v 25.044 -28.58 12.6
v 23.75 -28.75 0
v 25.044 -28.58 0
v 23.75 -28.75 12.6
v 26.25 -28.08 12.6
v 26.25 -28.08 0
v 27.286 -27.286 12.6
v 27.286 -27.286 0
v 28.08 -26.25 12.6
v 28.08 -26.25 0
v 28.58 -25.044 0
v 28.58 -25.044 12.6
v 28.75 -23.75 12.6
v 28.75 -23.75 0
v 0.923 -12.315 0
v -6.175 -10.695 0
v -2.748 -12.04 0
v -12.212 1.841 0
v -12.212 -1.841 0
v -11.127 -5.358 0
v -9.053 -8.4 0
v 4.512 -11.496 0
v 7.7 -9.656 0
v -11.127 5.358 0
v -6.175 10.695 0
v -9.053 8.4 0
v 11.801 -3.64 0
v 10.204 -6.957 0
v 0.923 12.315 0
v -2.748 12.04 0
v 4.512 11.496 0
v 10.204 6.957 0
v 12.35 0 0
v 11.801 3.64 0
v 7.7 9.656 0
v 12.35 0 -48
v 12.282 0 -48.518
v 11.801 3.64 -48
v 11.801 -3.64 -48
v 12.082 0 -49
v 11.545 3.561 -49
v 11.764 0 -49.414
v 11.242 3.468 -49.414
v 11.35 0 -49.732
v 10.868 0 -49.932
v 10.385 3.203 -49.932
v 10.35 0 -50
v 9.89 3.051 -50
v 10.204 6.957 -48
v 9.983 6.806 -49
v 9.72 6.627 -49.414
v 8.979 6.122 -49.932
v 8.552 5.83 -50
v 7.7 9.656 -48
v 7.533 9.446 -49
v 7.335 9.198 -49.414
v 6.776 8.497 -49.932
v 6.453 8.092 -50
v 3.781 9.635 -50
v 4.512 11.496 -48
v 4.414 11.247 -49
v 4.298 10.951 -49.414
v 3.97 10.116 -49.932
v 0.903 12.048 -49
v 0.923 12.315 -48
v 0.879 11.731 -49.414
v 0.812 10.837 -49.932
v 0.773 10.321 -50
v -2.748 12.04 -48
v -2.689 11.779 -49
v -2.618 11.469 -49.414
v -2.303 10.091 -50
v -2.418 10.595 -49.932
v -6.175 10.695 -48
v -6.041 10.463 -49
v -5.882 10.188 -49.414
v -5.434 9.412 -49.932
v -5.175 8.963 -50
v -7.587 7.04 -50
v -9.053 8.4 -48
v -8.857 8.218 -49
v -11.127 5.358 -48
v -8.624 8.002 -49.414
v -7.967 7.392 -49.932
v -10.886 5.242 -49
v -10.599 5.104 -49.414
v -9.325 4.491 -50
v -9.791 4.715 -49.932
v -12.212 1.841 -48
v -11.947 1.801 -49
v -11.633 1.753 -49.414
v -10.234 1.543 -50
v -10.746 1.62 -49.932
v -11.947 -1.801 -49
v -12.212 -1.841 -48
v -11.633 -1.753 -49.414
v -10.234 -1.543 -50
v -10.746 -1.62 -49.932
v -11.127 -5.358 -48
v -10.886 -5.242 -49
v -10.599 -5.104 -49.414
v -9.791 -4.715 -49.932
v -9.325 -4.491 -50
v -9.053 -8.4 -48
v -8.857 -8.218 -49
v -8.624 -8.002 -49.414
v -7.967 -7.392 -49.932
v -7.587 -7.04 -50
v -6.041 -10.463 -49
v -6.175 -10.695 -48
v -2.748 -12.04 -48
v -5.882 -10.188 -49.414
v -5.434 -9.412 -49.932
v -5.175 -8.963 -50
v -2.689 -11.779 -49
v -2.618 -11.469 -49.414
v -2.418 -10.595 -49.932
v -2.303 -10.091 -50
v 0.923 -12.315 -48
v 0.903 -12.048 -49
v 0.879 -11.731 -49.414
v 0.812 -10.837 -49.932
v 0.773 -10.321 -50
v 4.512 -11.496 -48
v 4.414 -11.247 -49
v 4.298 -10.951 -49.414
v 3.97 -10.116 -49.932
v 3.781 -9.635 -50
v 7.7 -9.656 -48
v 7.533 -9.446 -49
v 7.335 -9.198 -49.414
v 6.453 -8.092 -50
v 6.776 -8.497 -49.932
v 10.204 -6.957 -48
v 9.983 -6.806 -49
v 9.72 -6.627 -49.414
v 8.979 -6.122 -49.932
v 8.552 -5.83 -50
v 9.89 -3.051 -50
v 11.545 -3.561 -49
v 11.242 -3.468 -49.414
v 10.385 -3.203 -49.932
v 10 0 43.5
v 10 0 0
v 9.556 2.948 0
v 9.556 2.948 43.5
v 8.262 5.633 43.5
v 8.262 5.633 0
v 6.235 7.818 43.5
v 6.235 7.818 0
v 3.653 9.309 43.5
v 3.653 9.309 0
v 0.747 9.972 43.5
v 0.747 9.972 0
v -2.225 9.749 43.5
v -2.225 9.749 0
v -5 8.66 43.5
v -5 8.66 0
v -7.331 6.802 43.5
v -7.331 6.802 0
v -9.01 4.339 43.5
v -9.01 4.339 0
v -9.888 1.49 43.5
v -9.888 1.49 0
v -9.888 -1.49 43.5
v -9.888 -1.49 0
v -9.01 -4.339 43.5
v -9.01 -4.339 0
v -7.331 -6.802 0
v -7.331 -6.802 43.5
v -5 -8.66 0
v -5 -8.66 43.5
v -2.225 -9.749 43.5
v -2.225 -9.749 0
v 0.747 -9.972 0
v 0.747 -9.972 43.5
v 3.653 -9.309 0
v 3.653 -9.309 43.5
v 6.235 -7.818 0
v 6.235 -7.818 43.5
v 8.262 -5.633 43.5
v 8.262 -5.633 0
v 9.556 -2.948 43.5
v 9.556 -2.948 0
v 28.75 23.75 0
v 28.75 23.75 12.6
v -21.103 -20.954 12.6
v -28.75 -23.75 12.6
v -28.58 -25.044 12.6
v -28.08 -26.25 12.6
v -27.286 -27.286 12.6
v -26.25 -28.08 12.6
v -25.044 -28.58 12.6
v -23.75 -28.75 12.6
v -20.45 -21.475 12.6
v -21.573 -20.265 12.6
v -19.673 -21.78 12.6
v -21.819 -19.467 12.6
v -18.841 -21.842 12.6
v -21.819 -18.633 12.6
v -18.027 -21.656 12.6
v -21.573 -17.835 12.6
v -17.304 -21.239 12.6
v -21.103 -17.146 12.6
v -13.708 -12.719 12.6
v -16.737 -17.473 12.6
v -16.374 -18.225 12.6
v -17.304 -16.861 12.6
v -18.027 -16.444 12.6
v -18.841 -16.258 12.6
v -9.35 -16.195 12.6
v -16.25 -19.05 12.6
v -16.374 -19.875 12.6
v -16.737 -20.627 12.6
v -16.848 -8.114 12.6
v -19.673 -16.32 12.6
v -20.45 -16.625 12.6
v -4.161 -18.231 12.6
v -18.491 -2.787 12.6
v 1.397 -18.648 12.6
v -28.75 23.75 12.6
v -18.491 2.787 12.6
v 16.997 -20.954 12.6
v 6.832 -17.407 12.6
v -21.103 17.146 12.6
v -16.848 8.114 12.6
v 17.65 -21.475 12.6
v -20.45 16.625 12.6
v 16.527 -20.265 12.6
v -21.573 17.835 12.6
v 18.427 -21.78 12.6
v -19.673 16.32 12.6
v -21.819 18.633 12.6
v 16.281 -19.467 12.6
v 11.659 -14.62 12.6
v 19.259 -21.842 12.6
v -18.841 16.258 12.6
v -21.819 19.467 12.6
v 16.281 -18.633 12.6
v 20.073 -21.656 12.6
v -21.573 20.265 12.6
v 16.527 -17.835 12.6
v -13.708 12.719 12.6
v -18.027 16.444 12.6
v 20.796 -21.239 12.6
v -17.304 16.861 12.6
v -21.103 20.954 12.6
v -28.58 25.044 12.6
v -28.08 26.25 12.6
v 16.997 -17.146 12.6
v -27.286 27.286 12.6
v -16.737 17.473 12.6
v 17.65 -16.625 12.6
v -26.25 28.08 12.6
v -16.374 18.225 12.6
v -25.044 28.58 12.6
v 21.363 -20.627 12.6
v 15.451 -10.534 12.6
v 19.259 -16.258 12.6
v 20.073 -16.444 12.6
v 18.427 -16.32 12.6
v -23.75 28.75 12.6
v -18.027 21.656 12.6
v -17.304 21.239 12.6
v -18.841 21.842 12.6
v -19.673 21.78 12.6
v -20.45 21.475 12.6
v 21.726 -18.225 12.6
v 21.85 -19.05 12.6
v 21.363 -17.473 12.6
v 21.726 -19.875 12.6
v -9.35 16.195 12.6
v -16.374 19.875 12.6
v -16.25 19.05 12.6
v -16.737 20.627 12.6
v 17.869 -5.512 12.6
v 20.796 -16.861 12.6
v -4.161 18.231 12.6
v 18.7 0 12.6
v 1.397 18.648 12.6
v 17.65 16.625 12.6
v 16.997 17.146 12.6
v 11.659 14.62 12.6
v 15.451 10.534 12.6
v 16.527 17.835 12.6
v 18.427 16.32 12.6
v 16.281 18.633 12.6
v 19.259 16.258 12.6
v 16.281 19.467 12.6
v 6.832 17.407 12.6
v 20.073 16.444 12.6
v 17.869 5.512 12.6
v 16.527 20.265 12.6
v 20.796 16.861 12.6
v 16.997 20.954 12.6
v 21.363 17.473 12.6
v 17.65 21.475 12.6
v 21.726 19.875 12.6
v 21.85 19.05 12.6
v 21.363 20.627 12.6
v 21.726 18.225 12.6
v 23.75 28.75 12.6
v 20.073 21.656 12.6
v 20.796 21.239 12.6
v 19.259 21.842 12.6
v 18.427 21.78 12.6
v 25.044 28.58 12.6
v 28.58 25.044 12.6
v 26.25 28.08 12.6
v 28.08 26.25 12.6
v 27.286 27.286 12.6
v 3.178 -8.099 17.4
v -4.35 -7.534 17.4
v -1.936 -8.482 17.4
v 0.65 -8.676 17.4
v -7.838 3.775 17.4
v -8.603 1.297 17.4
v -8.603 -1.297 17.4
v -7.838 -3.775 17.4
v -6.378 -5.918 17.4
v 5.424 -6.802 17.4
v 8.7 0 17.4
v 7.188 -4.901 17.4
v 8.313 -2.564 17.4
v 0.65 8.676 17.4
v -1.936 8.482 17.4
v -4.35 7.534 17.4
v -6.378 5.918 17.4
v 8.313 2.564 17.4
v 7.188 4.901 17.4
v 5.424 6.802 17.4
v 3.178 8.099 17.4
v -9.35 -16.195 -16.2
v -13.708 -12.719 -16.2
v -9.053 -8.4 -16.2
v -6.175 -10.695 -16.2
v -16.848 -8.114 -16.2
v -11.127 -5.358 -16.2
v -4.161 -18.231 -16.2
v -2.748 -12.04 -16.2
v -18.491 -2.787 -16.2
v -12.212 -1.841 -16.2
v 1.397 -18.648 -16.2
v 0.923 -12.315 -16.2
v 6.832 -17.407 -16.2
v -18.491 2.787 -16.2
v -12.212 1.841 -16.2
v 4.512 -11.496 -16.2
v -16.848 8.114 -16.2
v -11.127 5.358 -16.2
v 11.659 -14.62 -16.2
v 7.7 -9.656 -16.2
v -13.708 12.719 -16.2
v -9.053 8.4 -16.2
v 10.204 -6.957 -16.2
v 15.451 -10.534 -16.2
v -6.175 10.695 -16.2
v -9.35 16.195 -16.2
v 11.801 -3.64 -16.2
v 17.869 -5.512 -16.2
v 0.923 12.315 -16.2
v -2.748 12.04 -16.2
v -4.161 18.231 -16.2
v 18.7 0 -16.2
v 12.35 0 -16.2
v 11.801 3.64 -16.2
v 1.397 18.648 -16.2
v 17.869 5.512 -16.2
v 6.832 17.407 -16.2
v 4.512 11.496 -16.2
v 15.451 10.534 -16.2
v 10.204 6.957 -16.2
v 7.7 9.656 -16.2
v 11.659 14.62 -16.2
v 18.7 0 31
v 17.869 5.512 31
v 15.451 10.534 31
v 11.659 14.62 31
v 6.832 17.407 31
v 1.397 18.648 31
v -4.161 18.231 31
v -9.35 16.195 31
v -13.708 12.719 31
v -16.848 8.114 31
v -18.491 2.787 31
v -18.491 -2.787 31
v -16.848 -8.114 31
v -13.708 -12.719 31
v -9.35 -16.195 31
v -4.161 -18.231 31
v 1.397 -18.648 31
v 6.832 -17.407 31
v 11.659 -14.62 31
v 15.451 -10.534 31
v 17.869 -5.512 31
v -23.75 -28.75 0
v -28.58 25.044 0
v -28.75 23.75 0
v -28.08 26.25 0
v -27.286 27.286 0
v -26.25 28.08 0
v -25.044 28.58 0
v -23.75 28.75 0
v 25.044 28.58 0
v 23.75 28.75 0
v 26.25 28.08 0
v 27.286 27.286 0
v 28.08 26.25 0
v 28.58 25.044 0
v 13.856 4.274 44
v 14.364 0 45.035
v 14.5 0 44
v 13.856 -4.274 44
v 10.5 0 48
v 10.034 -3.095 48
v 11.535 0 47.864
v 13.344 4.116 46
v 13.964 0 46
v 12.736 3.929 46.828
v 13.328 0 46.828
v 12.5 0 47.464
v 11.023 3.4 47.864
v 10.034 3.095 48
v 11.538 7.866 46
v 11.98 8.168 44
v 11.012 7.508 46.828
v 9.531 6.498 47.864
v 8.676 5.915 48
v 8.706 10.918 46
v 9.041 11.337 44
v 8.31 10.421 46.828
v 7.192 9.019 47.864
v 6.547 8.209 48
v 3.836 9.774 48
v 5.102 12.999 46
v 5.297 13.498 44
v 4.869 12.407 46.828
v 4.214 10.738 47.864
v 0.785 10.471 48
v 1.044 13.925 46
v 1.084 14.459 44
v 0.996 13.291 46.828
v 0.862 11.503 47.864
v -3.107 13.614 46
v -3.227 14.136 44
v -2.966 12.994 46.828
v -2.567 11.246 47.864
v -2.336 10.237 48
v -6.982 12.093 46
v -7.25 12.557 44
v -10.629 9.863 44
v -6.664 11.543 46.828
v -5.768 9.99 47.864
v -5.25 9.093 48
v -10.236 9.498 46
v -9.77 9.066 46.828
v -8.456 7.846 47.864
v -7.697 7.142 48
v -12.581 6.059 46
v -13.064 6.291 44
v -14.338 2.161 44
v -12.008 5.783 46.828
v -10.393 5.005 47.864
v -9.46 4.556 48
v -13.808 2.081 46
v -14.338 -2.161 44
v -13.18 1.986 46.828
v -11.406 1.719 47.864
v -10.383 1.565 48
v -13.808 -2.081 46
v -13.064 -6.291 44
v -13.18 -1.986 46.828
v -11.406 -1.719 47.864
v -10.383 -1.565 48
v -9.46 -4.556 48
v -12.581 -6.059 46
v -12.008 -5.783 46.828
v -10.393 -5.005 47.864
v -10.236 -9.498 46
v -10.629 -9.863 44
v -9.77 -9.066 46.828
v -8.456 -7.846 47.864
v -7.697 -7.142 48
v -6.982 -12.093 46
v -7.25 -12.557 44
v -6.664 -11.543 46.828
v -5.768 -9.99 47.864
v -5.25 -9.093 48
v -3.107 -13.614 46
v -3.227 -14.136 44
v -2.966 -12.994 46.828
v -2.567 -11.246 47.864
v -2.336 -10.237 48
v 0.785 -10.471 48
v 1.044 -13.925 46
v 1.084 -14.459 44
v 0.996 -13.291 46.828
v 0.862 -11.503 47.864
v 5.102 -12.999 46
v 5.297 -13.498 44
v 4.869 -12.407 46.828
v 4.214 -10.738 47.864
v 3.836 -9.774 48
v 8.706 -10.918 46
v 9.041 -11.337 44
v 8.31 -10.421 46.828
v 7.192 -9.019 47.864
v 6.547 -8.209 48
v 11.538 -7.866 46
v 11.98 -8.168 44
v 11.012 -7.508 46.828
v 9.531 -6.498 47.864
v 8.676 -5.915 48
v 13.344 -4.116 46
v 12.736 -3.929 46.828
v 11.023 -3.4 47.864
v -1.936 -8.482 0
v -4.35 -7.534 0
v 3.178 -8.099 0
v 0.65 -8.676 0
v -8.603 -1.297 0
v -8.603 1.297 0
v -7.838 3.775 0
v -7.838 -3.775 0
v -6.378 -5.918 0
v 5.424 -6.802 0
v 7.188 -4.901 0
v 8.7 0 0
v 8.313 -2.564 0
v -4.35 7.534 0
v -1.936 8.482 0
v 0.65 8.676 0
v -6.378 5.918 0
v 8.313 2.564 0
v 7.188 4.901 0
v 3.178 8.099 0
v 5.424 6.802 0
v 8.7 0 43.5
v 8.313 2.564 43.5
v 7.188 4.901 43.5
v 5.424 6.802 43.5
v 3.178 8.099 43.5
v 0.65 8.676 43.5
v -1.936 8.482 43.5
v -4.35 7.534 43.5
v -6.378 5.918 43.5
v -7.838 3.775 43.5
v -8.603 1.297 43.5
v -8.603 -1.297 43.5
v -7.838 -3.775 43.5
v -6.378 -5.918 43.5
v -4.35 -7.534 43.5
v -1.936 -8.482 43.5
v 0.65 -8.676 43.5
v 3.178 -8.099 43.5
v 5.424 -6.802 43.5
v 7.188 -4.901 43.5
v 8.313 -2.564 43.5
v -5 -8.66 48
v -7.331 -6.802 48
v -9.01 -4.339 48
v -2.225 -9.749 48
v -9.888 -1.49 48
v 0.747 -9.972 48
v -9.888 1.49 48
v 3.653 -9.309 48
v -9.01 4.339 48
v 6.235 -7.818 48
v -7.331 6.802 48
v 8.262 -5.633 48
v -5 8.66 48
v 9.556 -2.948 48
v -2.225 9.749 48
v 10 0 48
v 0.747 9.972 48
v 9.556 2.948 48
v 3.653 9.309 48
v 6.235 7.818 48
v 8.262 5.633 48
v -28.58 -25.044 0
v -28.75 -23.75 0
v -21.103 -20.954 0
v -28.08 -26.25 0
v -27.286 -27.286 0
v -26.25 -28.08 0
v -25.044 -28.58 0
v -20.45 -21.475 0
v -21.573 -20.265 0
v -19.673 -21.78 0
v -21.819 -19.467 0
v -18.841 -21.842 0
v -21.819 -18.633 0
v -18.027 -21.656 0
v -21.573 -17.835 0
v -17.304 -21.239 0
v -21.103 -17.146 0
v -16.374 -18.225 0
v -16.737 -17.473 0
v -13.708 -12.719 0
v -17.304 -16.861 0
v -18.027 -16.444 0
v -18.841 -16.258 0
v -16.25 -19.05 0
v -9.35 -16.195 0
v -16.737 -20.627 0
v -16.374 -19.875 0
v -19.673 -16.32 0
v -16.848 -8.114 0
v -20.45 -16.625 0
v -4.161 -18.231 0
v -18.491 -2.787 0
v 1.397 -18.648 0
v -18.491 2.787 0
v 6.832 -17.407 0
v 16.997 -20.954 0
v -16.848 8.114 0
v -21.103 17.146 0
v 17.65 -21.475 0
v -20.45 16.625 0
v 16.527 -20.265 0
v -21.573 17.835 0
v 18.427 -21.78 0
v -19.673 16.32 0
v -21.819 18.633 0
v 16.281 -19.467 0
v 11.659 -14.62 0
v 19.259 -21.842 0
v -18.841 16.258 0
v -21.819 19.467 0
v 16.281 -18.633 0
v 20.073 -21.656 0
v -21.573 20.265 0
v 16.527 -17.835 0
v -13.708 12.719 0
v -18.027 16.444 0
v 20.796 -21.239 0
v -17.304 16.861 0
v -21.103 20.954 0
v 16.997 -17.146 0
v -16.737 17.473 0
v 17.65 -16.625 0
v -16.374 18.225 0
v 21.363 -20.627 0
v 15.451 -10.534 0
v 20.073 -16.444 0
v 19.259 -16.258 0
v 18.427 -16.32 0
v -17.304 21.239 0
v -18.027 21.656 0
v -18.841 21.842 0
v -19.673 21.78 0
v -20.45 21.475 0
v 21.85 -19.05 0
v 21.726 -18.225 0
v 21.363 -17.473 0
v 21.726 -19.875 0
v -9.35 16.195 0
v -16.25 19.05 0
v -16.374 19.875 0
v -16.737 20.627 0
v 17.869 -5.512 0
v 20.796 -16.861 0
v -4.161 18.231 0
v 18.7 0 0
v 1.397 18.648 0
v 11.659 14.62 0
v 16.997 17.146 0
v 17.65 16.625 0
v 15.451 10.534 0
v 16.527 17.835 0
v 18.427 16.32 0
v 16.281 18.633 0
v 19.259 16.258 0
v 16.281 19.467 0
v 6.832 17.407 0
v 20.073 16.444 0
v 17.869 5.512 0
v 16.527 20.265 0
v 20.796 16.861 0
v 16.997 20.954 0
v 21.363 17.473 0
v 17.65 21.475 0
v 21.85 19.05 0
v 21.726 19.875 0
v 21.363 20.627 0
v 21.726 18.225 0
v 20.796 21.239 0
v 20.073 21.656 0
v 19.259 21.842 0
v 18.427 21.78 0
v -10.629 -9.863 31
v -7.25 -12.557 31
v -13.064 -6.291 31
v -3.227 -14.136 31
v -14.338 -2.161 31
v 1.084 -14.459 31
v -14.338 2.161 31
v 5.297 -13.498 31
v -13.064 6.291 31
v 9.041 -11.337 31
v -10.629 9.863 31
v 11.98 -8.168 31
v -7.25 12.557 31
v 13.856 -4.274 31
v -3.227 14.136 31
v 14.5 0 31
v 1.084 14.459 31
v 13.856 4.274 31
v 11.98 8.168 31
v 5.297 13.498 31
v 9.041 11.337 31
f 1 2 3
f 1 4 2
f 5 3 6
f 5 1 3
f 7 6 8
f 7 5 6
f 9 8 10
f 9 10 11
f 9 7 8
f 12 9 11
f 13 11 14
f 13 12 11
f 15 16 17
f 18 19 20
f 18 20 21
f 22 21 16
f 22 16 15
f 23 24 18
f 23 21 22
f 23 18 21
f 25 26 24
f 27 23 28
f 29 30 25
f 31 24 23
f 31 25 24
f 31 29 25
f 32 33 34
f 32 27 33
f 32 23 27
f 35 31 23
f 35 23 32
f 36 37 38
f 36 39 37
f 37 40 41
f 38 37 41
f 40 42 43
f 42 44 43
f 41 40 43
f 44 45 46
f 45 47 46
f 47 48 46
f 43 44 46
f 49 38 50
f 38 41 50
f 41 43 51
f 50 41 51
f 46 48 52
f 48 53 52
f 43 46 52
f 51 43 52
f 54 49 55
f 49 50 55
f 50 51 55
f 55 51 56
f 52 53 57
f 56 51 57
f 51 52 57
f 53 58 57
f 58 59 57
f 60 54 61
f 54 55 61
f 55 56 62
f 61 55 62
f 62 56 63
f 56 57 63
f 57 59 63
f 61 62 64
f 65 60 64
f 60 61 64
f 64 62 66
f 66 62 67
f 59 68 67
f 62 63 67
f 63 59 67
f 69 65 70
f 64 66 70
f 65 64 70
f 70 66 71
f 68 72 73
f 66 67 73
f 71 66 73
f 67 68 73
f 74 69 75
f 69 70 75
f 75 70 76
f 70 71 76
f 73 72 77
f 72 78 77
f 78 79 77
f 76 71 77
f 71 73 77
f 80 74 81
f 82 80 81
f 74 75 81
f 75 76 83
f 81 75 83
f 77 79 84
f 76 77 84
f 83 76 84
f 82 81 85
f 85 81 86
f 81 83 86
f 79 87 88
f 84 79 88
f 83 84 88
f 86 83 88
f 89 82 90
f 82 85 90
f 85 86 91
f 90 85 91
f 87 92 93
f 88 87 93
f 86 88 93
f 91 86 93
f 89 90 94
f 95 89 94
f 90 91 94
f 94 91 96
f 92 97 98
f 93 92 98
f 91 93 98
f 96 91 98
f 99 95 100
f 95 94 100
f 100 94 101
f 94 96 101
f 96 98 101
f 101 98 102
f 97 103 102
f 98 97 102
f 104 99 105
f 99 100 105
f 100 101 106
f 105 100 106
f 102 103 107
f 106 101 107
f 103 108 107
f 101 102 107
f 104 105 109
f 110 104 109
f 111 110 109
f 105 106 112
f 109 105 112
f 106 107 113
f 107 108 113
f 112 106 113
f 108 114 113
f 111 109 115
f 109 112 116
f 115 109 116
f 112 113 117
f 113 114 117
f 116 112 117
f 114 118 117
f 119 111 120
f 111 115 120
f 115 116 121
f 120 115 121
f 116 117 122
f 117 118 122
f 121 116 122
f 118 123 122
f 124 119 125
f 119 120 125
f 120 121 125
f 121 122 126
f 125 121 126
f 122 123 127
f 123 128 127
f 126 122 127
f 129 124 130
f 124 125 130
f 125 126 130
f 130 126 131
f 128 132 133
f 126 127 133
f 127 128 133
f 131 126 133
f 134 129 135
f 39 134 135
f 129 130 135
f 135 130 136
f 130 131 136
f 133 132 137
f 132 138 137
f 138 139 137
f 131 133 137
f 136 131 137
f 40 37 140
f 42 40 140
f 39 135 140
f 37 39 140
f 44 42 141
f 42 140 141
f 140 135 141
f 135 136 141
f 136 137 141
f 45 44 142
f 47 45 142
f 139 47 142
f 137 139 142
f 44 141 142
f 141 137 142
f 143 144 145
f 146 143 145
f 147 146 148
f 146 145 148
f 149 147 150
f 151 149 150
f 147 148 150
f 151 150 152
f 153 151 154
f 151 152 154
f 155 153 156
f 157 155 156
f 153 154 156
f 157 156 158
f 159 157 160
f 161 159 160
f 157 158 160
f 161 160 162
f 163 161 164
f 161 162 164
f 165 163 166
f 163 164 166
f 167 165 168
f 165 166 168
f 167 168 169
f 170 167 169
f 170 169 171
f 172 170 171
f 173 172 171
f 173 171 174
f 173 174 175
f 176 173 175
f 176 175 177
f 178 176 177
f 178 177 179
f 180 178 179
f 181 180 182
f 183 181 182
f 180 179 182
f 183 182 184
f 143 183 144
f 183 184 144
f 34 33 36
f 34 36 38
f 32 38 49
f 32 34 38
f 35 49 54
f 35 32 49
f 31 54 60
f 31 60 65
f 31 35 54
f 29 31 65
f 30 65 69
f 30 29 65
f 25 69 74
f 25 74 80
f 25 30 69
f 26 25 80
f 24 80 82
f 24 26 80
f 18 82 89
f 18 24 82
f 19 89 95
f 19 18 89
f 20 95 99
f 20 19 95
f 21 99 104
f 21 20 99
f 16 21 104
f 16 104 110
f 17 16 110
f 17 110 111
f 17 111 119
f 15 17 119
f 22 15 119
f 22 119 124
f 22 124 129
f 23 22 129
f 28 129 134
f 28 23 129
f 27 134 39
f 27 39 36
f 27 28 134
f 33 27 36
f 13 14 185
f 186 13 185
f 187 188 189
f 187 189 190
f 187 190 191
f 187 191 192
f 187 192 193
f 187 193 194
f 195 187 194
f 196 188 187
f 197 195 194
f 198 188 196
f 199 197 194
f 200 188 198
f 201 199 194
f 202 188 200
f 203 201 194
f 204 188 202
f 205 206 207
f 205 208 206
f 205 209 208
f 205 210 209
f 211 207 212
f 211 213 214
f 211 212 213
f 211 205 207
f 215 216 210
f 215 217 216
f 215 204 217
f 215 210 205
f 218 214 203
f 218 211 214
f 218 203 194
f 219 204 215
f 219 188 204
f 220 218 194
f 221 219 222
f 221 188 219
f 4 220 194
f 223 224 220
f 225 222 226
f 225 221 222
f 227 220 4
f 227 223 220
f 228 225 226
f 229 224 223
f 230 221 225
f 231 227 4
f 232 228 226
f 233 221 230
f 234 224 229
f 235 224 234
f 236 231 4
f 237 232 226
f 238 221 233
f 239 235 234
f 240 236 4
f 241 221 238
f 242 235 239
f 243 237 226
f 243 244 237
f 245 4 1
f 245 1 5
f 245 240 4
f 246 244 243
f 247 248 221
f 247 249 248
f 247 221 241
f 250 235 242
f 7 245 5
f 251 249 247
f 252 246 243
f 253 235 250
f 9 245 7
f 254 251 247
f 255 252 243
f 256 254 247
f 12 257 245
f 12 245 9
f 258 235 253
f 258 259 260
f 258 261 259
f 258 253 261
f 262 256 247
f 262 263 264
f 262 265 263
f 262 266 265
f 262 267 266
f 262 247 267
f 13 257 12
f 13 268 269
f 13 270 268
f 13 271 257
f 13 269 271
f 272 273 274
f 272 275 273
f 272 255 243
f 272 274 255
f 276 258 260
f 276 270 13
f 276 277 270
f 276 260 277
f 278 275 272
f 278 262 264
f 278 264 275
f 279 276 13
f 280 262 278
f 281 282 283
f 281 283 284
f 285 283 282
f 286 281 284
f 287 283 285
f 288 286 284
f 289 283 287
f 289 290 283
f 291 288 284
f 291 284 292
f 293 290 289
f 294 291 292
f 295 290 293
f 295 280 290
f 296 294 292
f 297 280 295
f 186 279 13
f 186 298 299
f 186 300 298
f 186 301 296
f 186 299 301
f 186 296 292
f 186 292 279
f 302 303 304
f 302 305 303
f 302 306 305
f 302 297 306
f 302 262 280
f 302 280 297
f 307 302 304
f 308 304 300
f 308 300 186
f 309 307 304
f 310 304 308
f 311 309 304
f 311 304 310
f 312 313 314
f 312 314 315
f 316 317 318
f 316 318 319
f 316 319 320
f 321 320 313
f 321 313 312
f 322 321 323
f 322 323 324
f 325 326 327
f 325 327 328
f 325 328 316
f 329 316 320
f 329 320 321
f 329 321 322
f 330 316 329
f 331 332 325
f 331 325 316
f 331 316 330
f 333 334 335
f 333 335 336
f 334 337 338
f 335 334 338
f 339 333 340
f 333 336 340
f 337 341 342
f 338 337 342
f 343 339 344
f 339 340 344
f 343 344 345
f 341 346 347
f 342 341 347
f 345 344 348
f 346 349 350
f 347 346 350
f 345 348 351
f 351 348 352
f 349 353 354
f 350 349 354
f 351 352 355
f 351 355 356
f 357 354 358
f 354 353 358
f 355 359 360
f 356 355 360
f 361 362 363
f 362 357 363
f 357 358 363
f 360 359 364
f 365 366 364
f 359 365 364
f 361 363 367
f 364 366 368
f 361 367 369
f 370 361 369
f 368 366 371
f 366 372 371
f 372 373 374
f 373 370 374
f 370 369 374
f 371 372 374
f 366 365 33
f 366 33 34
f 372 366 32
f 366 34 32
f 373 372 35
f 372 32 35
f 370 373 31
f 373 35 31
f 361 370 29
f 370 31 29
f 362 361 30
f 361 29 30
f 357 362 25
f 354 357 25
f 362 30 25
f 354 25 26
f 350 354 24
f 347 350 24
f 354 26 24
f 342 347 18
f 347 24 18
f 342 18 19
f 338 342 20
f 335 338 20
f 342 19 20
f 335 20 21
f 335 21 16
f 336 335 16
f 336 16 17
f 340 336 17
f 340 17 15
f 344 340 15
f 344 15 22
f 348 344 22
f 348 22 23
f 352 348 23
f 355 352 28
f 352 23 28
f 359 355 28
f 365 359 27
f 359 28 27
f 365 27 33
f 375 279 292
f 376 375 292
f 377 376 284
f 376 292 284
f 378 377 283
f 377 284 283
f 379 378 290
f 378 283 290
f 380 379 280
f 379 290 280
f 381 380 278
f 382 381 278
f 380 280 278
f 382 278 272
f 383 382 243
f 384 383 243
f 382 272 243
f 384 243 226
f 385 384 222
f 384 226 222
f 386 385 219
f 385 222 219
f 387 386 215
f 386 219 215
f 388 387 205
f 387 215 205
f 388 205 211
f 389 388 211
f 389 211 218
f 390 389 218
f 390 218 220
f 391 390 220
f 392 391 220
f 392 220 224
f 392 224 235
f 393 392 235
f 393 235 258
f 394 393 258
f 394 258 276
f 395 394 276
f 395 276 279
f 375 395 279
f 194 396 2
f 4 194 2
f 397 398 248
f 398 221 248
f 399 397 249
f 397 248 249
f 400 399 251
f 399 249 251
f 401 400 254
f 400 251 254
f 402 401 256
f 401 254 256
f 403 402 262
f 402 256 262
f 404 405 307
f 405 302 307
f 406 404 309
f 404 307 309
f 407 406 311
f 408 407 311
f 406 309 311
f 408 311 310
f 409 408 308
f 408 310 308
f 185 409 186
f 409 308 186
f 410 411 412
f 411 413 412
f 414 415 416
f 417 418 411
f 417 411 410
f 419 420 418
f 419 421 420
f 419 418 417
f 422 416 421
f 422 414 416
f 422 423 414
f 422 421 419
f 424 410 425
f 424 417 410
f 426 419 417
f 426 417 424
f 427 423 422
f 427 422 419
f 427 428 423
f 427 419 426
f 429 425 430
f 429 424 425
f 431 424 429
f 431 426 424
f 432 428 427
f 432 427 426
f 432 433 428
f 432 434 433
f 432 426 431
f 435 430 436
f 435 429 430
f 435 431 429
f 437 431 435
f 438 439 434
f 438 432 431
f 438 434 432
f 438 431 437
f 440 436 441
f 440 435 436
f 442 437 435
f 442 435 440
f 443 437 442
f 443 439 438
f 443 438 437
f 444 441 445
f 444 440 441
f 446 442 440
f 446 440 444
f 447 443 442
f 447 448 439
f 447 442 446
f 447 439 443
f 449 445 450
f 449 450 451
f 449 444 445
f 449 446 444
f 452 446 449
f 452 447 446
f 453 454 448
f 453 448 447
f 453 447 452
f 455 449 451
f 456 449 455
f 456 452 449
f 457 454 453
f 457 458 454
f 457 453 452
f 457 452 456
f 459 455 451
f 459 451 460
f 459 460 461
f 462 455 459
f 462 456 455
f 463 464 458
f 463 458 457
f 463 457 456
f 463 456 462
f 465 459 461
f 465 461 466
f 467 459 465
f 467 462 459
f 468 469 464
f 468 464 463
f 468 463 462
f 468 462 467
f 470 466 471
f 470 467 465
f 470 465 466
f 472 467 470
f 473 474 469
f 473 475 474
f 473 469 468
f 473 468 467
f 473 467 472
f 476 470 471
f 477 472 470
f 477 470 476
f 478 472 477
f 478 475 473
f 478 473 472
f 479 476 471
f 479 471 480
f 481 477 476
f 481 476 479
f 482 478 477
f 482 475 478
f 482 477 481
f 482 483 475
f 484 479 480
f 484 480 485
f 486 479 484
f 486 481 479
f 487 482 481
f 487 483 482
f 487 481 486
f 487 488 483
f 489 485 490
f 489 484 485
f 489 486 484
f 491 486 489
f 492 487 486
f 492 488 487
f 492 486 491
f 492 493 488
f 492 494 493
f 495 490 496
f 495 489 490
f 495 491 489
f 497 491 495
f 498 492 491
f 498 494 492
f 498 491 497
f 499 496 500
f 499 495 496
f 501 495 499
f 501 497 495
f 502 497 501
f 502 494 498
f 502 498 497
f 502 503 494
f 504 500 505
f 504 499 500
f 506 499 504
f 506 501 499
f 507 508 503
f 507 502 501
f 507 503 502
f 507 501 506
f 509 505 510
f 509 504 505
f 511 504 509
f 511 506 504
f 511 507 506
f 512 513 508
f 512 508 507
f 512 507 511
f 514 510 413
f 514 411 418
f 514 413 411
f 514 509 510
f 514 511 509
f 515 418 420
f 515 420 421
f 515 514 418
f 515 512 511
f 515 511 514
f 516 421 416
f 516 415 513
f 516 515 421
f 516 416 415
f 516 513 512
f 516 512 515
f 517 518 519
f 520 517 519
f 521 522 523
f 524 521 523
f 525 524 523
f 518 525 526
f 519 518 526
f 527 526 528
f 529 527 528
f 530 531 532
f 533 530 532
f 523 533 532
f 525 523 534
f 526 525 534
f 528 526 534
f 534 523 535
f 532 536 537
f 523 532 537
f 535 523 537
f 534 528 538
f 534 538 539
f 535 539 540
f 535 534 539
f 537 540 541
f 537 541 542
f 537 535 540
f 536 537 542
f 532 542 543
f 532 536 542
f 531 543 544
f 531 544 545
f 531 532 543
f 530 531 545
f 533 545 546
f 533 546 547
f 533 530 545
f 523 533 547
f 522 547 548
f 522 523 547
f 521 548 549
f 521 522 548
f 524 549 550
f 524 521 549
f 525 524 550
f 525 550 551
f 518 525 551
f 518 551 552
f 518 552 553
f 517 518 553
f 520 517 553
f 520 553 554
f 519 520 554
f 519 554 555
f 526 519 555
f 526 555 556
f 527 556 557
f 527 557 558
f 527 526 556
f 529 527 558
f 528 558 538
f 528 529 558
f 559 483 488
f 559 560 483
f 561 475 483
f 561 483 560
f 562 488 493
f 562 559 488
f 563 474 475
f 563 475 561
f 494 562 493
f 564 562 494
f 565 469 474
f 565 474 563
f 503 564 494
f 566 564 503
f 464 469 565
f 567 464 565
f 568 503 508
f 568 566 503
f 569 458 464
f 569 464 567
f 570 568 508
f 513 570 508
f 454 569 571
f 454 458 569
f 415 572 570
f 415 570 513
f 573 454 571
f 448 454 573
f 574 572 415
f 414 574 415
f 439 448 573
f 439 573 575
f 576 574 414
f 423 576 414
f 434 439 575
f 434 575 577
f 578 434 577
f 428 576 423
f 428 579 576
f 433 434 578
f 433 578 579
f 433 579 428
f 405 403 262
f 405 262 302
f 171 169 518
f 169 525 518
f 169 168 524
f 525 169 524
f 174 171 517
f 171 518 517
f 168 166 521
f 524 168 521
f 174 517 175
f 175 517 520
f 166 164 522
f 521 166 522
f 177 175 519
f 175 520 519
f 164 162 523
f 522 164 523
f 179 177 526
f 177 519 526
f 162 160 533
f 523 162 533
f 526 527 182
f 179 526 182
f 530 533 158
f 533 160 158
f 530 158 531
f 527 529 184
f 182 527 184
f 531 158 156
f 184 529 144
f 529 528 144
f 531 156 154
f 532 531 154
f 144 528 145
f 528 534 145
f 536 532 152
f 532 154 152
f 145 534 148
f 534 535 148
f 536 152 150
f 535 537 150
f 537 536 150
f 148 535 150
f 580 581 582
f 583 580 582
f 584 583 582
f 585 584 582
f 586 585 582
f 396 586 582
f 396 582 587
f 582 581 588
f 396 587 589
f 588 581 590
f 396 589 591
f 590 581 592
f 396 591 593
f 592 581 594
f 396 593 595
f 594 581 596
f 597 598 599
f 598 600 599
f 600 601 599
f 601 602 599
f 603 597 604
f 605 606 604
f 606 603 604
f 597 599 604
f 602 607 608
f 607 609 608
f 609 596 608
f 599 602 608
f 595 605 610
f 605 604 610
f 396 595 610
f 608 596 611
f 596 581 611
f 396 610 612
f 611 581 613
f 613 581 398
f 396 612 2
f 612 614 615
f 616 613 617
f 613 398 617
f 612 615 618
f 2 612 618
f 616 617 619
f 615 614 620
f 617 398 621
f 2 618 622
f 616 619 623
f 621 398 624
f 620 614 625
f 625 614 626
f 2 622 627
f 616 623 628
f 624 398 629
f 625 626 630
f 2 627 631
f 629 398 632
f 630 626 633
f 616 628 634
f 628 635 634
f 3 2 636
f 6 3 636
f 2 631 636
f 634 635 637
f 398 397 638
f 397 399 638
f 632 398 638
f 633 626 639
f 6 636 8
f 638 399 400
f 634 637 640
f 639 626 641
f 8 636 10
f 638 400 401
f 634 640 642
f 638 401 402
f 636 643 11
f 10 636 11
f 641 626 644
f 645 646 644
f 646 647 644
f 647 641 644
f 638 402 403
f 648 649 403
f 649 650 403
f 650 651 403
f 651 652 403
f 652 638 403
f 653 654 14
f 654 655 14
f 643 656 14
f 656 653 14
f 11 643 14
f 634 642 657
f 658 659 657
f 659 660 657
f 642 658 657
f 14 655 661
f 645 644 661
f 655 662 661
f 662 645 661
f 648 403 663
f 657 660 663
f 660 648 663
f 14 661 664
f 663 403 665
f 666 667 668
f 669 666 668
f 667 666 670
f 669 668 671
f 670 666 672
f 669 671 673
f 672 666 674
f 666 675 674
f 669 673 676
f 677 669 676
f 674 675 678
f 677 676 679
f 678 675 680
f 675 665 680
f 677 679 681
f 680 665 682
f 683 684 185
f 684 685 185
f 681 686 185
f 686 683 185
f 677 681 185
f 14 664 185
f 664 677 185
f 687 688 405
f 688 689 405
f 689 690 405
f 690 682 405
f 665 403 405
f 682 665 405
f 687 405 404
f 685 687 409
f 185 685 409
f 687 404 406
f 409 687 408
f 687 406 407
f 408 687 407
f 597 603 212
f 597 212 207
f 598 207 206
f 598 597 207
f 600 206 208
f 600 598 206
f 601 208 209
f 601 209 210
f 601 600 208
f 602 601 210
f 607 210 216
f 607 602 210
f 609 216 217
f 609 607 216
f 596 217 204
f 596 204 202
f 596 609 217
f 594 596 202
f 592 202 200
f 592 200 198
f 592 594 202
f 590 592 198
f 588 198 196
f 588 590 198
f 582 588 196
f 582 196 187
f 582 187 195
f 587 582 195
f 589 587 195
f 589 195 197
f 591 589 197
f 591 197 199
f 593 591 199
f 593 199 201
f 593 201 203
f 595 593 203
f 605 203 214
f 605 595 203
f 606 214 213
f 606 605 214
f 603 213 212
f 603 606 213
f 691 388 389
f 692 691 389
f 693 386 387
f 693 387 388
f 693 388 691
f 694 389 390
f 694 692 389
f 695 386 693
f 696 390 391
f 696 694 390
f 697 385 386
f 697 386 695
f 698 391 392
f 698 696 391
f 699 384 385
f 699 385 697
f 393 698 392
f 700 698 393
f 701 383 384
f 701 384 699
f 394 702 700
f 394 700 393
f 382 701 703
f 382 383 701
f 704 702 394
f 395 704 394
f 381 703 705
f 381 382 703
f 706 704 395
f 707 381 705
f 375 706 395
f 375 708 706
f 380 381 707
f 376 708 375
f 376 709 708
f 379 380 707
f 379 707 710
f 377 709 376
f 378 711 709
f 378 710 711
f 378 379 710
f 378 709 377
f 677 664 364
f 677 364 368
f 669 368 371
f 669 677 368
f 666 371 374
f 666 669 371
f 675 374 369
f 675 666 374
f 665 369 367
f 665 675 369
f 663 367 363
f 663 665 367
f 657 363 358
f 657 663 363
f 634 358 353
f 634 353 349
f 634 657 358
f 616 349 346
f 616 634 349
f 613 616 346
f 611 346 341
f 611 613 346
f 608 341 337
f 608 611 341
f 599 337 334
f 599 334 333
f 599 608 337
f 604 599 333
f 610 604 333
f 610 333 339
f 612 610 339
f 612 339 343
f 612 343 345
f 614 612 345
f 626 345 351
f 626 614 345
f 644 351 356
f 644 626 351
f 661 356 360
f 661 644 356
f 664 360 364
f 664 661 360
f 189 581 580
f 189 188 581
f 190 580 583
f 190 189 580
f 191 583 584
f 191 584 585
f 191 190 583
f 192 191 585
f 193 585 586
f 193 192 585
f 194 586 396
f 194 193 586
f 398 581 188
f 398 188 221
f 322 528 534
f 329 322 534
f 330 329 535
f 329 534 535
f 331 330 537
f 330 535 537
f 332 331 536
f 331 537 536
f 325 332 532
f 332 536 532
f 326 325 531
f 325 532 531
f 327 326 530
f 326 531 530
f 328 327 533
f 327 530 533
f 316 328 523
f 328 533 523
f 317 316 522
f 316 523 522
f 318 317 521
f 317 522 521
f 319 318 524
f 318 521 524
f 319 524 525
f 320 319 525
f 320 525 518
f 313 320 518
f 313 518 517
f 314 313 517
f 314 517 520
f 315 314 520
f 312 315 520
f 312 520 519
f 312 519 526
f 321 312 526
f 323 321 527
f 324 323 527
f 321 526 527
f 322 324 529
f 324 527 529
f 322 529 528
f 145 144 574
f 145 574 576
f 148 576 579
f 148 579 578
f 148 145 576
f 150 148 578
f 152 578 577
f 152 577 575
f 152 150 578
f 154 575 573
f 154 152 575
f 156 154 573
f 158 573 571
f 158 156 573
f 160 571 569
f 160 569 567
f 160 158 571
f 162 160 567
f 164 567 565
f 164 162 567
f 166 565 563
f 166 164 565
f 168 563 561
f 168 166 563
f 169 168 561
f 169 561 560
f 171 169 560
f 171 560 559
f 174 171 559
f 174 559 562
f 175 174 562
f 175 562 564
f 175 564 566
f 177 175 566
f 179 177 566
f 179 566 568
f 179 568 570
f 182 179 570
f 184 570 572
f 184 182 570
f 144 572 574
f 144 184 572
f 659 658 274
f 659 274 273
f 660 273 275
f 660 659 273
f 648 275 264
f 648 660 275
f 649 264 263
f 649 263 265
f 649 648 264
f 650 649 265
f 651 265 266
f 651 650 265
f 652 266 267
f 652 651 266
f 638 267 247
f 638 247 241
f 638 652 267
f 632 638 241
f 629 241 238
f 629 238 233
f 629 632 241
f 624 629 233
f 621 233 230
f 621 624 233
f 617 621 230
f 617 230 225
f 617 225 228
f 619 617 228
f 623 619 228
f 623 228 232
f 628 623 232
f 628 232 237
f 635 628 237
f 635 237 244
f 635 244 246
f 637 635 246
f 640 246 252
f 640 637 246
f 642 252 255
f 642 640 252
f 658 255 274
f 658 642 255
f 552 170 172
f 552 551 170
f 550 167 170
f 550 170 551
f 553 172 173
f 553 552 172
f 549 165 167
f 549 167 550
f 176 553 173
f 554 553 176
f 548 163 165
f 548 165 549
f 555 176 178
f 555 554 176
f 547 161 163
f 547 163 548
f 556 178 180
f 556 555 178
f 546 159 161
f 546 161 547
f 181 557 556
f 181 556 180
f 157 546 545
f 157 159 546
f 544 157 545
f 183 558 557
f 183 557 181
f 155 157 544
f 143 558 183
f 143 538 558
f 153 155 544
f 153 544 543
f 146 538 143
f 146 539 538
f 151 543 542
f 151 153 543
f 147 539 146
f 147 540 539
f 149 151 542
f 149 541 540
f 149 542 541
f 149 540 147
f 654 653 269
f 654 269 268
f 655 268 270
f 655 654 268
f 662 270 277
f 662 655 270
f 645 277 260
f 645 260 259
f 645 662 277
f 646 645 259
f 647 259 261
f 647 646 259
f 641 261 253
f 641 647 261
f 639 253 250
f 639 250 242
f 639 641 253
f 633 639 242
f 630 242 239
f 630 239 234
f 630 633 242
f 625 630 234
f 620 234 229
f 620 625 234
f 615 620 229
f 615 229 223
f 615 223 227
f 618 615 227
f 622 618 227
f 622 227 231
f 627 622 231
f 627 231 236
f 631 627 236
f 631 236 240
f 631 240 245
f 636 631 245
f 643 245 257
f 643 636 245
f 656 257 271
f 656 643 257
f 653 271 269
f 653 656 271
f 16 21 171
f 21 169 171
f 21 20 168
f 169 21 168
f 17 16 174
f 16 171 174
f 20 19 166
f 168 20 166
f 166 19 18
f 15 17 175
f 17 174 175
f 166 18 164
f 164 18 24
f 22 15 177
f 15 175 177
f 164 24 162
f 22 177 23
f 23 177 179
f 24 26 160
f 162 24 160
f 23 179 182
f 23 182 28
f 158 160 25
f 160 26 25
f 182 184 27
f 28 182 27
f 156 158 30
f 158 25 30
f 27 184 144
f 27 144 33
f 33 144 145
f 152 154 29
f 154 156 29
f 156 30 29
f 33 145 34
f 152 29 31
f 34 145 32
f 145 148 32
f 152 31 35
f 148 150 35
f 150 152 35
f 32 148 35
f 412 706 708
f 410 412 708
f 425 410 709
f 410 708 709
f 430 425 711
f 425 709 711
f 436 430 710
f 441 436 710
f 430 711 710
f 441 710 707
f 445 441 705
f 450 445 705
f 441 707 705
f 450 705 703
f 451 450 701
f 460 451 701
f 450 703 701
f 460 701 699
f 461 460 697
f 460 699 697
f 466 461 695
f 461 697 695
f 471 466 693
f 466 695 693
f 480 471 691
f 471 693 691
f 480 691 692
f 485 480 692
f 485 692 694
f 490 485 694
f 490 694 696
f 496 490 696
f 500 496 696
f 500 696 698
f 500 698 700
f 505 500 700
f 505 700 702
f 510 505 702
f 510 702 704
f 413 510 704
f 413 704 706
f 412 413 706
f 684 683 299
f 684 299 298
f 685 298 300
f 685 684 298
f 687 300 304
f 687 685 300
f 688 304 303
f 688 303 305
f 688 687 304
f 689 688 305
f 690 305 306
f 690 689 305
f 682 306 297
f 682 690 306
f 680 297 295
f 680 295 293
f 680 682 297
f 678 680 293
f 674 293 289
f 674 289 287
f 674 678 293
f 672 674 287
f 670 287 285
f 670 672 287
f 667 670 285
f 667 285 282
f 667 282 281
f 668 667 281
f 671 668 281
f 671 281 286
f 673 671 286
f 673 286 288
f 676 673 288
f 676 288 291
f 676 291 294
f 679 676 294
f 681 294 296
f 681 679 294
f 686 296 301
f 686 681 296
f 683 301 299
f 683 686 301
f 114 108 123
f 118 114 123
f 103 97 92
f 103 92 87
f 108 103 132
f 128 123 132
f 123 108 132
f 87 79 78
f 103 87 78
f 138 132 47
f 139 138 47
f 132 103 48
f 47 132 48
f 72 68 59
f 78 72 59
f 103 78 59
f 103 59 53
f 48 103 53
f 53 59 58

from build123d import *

# Parameters (mm, degrees)
F0_W      = 57.5
F0_H      = 57.5
F0_R      = 2.8
F0_R_2    = 18.7
F1_DEPTH  = 12.6
F0_R_3    = 14.5
F2_DEPTH  = 31
F0_R_4    = 10
F3_DEPTH  = 48
F0_R_5    = 8.7
F4_DEPTH  = 43.5
F5_DEPTH  = 17.4
F6_R      = 4
F7_R      = 5
F8_R      = 12.35
F9_DEPTH  = 50
F8_R_2    = 18.7
F10_DEPTH = 16.2
F11_R     = 2


with BuildPart() as f1:
    # F0 (on Top) → F1 (new body)
    with BuildSketch(Plane.XY):
        Rectangle(F0_W, F0_H)
        with Locations((-19.05, -19.05)):
            Circle(F0_R, mode=Mode.SUBTRACT)
        with Locations((19.05, -19.05)):
            Circle(F0_R, mode=Mode.SUBTRACT)
        with Locations((-19.05, 19.05)):
            Circle(F0_R, mode=Mode.SUBTRACT)
        Circle(F0_R_2, mode=Mode.SUBTRACT)
        with Locations((19.05, 19.05)):
            Circle(F0_R, mode=Mode.SUBTRACT)
    extrude(amount=F1_DEPTH)

    # F0 (on Top) → F2 (join)
    with BuildSketch(Plane.XY):
        Circle(F0_R_2)
        Circle(F0_R_3, mode=Mode.SUBTRACT)
    extrude(amount=F2_DEPTH)

    # F0 (on Top) → F3 (join)
    with BuildSketch(Plane.XY):
        Circle(F0_R_3)
        Circle(F0_R_4, mode=Mode.SUBTRACT)
    extrude(amount=F3_DEPTH)

    # F6
    f6_edges = [f1.edges().sort_by_distance(p)[0] for p in [
        (-14.5, 0, 48),
    ]]
    fillet(f6_edges, radius=F6_R)

    # F7
    f7_edges = [f1.edges().sort_by_distance(p)[0] for p in [
        (-28.75, -28.75, 6.3),
        (28.75, -28.75, 6.3),
        (28.75, 28.75, 6.3),
        (-28.75, 28.75, 6.3),
    ]]
    fillet(f7_edges, radius=F7_R)

    # F8 (on face) → F10 (join)
    with BuildSketch(Plane.XY):
        Circle(F8_R_2)
        Circle(F8_R, mode=Mode.SUBTRACT)
    extrude(amount=-F10_DEPTH)


with BuildPart() as f4:
    # F0 (on Top) → F4 (new body)
    with BuildSketch(Plane.XY):
        Circle(F0_R_4)
        Circle(F0_R_5, mode=Mode.SUBTRACT)
    extrude(amount=F4_DEPTH)


with BuildPart() as f5:
    # F0 (on Top) → F5 (new body)
    with BuildSketch(Plane.XY):
        Circle(F0_R_5)
    extrude(amount=F5_DEPTH)


with BuildPart() as f9:
    # F8 (on face) → F9 (new body)
    with BuildSketch(Plane.XY):
        Circle(F8_R)
    extrude(amount=-F9_DEPTH)

    # F11
    f11_edges = [f9.edges().sort_by_distance(p)[0] for p in [
        (-12.35, 0, -50),
    ]]
    fillet(f11_edges, radius=F11_R)


solid = Compound([f1.part, f4.part, f5.part, f9.part])
